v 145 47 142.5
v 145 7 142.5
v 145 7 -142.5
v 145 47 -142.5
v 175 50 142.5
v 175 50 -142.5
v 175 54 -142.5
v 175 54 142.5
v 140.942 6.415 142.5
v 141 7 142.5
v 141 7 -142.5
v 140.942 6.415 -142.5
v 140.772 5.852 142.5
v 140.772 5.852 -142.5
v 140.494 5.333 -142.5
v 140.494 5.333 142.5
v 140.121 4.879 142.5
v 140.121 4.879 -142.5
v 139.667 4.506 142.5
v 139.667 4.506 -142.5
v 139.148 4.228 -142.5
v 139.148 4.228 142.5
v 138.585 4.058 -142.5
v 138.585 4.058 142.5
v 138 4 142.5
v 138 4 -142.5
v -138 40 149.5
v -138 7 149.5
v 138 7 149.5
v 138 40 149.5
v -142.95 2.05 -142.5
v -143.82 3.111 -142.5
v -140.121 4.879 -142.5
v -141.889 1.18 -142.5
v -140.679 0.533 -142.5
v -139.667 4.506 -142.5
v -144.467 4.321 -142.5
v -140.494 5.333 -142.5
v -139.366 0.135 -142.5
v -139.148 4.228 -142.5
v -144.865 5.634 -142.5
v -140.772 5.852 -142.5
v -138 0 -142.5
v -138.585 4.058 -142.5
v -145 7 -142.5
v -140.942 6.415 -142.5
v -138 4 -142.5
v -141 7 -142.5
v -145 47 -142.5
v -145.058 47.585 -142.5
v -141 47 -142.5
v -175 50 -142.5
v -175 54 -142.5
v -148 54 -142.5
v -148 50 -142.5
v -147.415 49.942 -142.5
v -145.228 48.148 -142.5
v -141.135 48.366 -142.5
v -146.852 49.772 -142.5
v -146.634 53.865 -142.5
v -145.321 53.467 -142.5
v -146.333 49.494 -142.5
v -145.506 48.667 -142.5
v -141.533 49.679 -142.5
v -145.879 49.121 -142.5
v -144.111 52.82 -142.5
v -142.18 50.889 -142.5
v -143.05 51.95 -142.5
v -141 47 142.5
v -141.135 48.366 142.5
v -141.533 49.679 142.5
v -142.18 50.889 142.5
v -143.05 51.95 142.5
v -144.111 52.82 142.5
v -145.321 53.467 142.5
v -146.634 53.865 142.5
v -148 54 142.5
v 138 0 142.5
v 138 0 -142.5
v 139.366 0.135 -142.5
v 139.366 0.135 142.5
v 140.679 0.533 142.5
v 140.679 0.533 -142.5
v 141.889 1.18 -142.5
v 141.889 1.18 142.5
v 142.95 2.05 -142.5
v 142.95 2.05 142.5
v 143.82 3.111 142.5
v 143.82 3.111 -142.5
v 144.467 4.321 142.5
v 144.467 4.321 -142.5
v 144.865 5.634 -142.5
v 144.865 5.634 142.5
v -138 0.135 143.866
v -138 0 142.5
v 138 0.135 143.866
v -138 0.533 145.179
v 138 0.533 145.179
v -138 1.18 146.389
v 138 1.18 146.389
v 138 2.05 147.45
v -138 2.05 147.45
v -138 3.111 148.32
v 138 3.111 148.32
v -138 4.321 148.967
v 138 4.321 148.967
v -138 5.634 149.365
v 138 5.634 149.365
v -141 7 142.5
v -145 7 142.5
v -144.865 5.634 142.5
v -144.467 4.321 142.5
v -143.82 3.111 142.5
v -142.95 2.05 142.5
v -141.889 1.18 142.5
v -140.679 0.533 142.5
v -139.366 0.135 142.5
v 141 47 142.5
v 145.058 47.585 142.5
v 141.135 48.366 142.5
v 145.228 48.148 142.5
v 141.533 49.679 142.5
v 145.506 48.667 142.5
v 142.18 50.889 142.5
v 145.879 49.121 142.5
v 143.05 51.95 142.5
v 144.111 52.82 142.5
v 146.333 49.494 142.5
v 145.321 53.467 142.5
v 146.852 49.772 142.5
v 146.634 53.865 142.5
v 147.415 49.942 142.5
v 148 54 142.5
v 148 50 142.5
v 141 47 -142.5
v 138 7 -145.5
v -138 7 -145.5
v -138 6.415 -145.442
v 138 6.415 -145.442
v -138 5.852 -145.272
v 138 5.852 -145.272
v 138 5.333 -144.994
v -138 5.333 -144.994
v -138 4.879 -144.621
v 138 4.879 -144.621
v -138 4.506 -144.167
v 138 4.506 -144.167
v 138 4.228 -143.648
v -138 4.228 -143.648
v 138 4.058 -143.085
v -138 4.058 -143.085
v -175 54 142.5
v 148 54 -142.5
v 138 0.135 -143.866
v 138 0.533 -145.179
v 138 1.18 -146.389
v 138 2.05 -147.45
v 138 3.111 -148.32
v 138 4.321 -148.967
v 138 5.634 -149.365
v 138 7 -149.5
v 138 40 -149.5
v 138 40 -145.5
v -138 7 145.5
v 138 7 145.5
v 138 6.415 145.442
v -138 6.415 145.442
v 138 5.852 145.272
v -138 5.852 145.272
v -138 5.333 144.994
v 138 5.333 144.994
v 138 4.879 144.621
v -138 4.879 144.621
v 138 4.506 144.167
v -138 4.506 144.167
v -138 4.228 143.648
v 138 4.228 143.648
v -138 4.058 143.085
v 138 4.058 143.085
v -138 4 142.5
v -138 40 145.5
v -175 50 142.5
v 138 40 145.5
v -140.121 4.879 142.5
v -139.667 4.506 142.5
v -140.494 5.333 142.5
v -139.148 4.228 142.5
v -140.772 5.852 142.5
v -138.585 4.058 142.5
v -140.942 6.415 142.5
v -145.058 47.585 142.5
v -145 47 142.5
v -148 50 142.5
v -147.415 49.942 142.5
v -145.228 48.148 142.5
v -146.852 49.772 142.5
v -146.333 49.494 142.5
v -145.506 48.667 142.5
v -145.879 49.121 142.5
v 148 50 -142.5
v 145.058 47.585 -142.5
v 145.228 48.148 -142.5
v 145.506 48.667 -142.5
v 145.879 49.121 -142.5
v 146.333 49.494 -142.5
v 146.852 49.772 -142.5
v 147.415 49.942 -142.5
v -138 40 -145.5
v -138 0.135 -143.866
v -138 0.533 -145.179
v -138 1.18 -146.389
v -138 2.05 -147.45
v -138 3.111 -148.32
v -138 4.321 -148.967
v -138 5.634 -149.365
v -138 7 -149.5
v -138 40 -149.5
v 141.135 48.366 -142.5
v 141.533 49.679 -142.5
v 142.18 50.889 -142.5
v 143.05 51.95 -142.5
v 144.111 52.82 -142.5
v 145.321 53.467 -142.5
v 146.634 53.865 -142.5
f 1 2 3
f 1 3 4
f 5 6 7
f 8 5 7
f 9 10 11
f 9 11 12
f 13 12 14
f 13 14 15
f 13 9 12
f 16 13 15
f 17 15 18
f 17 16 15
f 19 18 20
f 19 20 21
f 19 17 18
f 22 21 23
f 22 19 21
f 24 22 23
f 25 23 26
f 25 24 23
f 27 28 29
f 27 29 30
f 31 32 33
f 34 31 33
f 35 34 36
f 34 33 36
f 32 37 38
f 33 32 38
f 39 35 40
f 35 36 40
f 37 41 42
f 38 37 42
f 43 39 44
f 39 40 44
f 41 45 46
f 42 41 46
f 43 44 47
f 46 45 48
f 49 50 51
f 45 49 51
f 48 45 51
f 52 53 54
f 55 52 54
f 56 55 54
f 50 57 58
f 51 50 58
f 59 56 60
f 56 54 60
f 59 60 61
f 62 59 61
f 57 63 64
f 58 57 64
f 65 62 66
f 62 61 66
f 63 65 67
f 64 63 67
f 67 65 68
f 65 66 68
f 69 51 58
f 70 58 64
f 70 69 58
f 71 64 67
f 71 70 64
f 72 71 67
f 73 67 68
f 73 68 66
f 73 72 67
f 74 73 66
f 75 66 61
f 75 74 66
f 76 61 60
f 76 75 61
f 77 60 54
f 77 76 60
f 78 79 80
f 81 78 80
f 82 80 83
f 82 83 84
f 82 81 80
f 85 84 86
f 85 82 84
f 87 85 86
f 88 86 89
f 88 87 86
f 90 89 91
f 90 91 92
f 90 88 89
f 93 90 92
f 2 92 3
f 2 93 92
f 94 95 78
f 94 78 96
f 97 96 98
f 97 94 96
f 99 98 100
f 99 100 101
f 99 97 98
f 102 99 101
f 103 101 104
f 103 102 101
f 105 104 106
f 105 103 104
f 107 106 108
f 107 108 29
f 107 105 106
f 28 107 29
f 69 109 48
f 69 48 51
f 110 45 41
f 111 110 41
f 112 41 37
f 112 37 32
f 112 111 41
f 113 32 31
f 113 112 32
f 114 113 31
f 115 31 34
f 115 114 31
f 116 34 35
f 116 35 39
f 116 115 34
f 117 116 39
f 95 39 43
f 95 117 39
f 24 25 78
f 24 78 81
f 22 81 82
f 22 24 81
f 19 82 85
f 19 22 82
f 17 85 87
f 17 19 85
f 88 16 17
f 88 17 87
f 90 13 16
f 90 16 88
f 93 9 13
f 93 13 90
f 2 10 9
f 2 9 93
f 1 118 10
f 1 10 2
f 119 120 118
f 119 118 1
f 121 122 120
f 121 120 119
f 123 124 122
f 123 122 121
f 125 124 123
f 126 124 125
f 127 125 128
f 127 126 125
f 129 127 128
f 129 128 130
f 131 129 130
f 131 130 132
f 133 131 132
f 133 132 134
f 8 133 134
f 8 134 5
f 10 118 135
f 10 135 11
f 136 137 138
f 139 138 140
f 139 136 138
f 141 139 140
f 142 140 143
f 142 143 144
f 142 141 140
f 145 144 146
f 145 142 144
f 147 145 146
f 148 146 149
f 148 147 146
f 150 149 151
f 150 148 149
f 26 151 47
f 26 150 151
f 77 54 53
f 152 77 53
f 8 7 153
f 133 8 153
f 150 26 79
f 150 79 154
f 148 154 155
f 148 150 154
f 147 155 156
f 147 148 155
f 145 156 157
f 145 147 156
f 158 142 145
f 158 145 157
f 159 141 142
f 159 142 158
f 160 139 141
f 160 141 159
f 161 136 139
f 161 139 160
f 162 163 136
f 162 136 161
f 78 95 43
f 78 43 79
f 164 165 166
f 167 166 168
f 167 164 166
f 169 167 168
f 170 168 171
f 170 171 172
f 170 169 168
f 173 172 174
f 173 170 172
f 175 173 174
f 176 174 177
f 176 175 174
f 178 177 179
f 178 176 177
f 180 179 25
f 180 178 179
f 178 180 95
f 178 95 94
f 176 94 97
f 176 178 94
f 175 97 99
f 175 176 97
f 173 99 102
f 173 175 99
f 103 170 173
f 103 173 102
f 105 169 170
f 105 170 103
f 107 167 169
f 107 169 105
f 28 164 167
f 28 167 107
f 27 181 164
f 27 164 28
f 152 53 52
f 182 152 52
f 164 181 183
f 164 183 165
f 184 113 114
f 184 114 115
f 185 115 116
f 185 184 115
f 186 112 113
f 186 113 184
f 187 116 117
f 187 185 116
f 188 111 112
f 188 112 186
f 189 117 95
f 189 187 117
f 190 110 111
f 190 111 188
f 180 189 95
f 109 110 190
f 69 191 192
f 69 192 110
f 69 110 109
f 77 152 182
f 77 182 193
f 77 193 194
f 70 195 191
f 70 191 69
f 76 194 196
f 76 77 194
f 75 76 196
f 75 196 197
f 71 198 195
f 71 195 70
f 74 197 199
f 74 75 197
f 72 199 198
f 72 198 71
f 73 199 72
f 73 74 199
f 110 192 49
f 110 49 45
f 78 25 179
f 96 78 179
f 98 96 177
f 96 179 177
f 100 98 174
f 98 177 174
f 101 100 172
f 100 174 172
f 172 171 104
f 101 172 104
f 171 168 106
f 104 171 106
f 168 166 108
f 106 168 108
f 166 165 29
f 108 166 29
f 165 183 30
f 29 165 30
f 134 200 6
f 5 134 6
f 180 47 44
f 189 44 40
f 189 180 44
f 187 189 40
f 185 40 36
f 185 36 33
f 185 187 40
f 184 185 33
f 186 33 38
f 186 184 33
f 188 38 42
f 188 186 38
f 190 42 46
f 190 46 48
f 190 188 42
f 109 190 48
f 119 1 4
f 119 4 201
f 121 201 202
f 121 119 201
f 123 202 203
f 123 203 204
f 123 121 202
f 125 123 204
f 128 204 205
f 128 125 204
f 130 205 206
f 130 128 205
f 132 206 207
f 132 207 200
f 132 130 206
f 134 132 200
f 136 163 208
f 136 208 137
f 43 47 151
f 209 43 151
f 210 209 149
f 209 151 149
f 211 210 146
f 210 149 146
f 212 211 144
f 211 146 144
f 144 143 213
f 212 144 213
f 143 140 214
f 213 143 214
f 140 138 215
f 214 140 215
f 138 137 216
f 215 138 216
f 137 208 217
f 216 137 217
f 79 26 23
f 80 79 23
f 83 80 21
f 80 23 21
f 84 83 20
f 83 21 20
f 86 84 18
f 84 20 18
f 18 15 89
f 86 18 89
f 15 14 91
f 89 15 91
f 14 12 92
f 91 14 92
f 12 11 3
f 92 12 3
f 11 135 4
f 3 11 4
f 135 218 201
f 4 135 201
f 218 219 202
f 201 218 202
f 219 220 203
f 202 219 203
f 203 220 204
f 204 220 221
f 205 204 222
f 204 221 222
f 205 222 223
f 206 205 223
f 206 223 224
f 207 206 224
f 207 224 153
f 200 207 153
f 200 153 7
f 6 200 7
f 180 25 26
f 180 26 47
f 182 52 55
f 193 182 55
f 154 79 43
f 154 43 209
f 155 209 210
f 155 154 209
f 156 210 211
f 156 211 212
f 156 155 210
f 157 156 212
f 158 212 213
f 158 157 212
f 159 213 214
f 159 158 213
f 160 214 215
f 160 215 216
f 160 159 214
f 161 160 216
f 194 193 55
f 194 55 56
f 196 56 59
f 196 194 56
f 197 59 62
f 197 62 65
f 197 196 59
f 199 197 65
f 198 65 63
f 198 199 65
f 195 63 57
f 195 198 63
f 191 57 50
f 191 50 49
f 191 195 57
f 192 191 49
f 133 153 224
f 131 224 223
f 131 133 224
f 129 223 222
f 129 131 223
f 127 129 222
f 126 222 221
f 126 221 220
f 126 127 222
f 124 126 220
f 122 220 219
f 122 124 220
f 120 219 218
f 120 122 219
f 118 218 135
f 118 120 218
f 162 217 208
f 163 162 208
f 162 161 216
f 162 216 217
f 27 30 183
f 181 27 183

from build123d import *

# Parameters (mm, degrees)
BASE_FLANGIA1_DEPTH       = 142.5
BORDO_FLANGIA1_DEPTH      = 276
BORDO_FLANGIA1_BEND_DEPTH = 276


# Sheet-metal steps are written as plain solids
with BuildPart() as part:
    # Schizzo1 → Base-Flangia1 (new, symmetric)
    with BuildSketch(Plane.XY):
        with BuildLine():
            Line((-175, 50), (-148, 50))
            ThreePointArc((-148, 50), (-145.878679656, 49.121320344), (-145, 47))
            Line((-145, 47), (-145, 7))
            ThreePointArc((-145, 7), (-142.949747468, 2.050252532), (-138, 0))
            Line((-138, 0), (138, 0))
            ThreePointArc((138, 0), (142.949747468, 2.050252532), (145, 7))
            Line((145, 7), (145, 47))
            ThreePointArc((145, 47), (145.878679656, 49.121320344), (148, 50))
            Line((148, 50), (175, 50))
            Line((175, 50), (175, 54))
            Line((175, 54), (148, 54))
            ThreePointArc((148, 54), (143.050252532, 51.949747468), (141, 47))
            Line((141, 47), (141, 7))
            ThreePointArc((141, 7), (140.121320344, 4.878679656), (138, 4))
            Line((138, 4), (-138, 4))
            ThreePointArc((-138, 4), (-140.121320344, 4.878679656), (-141, 7))
            Line((-141, 7), (-141, 47))
            ThreePointArc((-141, 47), (-143.050252532, 51.949747468), (-148, 54))
            Line((-148, 54), (-175, 54))
            Line((-175, 54), (-175, 50))
        make_face()
    extrude(amount=BASE_FLANGIA1_DEPTH, both=True)

    # Bordo-Flangia1 section (across the edge) → Bordo-Flangia1 (add)
    with BuildSketch(Plane(origin=(-138, 4, 145.5), x_dir=(0, 0, -1), z_dir=(1, 0, 0))):
        with BuildLine():
            Line((-4, 3), (-4, 36))
            Line((-4, 36), (0, 36))
            Line((0, 36), (0, 3))
            ThreePointArc((0, 3), (0.878679656, 0.878679656), (3, 0))
            Line((3, 0), (3, -4))
            ThreePointArc((3, -4), (-1.949747468, -1.949747468), (-4, 3))
        make_face()
    extrude(amount=BORDO_FLANGIA1_DEPTH)

    # Bordo-Flangia1 section 2 (across the edge) → Bordo-Flangia1 bend (add)
    with BuildSketch(Plane(origin=(138, 4, -145.5), x_dir=(0, 0, 1), z_dir=(-1, 0, 0))):
        with BuildLine():
            Line((-4, 3), (-4, 36))
            Line((-4, 36), (0, 36))
            Line((0, 36), (0, 3))
            ThreePointArc((0, 3), (0.878679656, 0.878679656), (3, 0))
            Line((3, 0), (3, -4))
            ThreePointArc((3, -4), (-1.949747468, -1.949747468), (-4, 3))
        make_face()
    extrude(amount=BORDO_FLANGIA1_BEND_DEPTH)


solid = part.part
